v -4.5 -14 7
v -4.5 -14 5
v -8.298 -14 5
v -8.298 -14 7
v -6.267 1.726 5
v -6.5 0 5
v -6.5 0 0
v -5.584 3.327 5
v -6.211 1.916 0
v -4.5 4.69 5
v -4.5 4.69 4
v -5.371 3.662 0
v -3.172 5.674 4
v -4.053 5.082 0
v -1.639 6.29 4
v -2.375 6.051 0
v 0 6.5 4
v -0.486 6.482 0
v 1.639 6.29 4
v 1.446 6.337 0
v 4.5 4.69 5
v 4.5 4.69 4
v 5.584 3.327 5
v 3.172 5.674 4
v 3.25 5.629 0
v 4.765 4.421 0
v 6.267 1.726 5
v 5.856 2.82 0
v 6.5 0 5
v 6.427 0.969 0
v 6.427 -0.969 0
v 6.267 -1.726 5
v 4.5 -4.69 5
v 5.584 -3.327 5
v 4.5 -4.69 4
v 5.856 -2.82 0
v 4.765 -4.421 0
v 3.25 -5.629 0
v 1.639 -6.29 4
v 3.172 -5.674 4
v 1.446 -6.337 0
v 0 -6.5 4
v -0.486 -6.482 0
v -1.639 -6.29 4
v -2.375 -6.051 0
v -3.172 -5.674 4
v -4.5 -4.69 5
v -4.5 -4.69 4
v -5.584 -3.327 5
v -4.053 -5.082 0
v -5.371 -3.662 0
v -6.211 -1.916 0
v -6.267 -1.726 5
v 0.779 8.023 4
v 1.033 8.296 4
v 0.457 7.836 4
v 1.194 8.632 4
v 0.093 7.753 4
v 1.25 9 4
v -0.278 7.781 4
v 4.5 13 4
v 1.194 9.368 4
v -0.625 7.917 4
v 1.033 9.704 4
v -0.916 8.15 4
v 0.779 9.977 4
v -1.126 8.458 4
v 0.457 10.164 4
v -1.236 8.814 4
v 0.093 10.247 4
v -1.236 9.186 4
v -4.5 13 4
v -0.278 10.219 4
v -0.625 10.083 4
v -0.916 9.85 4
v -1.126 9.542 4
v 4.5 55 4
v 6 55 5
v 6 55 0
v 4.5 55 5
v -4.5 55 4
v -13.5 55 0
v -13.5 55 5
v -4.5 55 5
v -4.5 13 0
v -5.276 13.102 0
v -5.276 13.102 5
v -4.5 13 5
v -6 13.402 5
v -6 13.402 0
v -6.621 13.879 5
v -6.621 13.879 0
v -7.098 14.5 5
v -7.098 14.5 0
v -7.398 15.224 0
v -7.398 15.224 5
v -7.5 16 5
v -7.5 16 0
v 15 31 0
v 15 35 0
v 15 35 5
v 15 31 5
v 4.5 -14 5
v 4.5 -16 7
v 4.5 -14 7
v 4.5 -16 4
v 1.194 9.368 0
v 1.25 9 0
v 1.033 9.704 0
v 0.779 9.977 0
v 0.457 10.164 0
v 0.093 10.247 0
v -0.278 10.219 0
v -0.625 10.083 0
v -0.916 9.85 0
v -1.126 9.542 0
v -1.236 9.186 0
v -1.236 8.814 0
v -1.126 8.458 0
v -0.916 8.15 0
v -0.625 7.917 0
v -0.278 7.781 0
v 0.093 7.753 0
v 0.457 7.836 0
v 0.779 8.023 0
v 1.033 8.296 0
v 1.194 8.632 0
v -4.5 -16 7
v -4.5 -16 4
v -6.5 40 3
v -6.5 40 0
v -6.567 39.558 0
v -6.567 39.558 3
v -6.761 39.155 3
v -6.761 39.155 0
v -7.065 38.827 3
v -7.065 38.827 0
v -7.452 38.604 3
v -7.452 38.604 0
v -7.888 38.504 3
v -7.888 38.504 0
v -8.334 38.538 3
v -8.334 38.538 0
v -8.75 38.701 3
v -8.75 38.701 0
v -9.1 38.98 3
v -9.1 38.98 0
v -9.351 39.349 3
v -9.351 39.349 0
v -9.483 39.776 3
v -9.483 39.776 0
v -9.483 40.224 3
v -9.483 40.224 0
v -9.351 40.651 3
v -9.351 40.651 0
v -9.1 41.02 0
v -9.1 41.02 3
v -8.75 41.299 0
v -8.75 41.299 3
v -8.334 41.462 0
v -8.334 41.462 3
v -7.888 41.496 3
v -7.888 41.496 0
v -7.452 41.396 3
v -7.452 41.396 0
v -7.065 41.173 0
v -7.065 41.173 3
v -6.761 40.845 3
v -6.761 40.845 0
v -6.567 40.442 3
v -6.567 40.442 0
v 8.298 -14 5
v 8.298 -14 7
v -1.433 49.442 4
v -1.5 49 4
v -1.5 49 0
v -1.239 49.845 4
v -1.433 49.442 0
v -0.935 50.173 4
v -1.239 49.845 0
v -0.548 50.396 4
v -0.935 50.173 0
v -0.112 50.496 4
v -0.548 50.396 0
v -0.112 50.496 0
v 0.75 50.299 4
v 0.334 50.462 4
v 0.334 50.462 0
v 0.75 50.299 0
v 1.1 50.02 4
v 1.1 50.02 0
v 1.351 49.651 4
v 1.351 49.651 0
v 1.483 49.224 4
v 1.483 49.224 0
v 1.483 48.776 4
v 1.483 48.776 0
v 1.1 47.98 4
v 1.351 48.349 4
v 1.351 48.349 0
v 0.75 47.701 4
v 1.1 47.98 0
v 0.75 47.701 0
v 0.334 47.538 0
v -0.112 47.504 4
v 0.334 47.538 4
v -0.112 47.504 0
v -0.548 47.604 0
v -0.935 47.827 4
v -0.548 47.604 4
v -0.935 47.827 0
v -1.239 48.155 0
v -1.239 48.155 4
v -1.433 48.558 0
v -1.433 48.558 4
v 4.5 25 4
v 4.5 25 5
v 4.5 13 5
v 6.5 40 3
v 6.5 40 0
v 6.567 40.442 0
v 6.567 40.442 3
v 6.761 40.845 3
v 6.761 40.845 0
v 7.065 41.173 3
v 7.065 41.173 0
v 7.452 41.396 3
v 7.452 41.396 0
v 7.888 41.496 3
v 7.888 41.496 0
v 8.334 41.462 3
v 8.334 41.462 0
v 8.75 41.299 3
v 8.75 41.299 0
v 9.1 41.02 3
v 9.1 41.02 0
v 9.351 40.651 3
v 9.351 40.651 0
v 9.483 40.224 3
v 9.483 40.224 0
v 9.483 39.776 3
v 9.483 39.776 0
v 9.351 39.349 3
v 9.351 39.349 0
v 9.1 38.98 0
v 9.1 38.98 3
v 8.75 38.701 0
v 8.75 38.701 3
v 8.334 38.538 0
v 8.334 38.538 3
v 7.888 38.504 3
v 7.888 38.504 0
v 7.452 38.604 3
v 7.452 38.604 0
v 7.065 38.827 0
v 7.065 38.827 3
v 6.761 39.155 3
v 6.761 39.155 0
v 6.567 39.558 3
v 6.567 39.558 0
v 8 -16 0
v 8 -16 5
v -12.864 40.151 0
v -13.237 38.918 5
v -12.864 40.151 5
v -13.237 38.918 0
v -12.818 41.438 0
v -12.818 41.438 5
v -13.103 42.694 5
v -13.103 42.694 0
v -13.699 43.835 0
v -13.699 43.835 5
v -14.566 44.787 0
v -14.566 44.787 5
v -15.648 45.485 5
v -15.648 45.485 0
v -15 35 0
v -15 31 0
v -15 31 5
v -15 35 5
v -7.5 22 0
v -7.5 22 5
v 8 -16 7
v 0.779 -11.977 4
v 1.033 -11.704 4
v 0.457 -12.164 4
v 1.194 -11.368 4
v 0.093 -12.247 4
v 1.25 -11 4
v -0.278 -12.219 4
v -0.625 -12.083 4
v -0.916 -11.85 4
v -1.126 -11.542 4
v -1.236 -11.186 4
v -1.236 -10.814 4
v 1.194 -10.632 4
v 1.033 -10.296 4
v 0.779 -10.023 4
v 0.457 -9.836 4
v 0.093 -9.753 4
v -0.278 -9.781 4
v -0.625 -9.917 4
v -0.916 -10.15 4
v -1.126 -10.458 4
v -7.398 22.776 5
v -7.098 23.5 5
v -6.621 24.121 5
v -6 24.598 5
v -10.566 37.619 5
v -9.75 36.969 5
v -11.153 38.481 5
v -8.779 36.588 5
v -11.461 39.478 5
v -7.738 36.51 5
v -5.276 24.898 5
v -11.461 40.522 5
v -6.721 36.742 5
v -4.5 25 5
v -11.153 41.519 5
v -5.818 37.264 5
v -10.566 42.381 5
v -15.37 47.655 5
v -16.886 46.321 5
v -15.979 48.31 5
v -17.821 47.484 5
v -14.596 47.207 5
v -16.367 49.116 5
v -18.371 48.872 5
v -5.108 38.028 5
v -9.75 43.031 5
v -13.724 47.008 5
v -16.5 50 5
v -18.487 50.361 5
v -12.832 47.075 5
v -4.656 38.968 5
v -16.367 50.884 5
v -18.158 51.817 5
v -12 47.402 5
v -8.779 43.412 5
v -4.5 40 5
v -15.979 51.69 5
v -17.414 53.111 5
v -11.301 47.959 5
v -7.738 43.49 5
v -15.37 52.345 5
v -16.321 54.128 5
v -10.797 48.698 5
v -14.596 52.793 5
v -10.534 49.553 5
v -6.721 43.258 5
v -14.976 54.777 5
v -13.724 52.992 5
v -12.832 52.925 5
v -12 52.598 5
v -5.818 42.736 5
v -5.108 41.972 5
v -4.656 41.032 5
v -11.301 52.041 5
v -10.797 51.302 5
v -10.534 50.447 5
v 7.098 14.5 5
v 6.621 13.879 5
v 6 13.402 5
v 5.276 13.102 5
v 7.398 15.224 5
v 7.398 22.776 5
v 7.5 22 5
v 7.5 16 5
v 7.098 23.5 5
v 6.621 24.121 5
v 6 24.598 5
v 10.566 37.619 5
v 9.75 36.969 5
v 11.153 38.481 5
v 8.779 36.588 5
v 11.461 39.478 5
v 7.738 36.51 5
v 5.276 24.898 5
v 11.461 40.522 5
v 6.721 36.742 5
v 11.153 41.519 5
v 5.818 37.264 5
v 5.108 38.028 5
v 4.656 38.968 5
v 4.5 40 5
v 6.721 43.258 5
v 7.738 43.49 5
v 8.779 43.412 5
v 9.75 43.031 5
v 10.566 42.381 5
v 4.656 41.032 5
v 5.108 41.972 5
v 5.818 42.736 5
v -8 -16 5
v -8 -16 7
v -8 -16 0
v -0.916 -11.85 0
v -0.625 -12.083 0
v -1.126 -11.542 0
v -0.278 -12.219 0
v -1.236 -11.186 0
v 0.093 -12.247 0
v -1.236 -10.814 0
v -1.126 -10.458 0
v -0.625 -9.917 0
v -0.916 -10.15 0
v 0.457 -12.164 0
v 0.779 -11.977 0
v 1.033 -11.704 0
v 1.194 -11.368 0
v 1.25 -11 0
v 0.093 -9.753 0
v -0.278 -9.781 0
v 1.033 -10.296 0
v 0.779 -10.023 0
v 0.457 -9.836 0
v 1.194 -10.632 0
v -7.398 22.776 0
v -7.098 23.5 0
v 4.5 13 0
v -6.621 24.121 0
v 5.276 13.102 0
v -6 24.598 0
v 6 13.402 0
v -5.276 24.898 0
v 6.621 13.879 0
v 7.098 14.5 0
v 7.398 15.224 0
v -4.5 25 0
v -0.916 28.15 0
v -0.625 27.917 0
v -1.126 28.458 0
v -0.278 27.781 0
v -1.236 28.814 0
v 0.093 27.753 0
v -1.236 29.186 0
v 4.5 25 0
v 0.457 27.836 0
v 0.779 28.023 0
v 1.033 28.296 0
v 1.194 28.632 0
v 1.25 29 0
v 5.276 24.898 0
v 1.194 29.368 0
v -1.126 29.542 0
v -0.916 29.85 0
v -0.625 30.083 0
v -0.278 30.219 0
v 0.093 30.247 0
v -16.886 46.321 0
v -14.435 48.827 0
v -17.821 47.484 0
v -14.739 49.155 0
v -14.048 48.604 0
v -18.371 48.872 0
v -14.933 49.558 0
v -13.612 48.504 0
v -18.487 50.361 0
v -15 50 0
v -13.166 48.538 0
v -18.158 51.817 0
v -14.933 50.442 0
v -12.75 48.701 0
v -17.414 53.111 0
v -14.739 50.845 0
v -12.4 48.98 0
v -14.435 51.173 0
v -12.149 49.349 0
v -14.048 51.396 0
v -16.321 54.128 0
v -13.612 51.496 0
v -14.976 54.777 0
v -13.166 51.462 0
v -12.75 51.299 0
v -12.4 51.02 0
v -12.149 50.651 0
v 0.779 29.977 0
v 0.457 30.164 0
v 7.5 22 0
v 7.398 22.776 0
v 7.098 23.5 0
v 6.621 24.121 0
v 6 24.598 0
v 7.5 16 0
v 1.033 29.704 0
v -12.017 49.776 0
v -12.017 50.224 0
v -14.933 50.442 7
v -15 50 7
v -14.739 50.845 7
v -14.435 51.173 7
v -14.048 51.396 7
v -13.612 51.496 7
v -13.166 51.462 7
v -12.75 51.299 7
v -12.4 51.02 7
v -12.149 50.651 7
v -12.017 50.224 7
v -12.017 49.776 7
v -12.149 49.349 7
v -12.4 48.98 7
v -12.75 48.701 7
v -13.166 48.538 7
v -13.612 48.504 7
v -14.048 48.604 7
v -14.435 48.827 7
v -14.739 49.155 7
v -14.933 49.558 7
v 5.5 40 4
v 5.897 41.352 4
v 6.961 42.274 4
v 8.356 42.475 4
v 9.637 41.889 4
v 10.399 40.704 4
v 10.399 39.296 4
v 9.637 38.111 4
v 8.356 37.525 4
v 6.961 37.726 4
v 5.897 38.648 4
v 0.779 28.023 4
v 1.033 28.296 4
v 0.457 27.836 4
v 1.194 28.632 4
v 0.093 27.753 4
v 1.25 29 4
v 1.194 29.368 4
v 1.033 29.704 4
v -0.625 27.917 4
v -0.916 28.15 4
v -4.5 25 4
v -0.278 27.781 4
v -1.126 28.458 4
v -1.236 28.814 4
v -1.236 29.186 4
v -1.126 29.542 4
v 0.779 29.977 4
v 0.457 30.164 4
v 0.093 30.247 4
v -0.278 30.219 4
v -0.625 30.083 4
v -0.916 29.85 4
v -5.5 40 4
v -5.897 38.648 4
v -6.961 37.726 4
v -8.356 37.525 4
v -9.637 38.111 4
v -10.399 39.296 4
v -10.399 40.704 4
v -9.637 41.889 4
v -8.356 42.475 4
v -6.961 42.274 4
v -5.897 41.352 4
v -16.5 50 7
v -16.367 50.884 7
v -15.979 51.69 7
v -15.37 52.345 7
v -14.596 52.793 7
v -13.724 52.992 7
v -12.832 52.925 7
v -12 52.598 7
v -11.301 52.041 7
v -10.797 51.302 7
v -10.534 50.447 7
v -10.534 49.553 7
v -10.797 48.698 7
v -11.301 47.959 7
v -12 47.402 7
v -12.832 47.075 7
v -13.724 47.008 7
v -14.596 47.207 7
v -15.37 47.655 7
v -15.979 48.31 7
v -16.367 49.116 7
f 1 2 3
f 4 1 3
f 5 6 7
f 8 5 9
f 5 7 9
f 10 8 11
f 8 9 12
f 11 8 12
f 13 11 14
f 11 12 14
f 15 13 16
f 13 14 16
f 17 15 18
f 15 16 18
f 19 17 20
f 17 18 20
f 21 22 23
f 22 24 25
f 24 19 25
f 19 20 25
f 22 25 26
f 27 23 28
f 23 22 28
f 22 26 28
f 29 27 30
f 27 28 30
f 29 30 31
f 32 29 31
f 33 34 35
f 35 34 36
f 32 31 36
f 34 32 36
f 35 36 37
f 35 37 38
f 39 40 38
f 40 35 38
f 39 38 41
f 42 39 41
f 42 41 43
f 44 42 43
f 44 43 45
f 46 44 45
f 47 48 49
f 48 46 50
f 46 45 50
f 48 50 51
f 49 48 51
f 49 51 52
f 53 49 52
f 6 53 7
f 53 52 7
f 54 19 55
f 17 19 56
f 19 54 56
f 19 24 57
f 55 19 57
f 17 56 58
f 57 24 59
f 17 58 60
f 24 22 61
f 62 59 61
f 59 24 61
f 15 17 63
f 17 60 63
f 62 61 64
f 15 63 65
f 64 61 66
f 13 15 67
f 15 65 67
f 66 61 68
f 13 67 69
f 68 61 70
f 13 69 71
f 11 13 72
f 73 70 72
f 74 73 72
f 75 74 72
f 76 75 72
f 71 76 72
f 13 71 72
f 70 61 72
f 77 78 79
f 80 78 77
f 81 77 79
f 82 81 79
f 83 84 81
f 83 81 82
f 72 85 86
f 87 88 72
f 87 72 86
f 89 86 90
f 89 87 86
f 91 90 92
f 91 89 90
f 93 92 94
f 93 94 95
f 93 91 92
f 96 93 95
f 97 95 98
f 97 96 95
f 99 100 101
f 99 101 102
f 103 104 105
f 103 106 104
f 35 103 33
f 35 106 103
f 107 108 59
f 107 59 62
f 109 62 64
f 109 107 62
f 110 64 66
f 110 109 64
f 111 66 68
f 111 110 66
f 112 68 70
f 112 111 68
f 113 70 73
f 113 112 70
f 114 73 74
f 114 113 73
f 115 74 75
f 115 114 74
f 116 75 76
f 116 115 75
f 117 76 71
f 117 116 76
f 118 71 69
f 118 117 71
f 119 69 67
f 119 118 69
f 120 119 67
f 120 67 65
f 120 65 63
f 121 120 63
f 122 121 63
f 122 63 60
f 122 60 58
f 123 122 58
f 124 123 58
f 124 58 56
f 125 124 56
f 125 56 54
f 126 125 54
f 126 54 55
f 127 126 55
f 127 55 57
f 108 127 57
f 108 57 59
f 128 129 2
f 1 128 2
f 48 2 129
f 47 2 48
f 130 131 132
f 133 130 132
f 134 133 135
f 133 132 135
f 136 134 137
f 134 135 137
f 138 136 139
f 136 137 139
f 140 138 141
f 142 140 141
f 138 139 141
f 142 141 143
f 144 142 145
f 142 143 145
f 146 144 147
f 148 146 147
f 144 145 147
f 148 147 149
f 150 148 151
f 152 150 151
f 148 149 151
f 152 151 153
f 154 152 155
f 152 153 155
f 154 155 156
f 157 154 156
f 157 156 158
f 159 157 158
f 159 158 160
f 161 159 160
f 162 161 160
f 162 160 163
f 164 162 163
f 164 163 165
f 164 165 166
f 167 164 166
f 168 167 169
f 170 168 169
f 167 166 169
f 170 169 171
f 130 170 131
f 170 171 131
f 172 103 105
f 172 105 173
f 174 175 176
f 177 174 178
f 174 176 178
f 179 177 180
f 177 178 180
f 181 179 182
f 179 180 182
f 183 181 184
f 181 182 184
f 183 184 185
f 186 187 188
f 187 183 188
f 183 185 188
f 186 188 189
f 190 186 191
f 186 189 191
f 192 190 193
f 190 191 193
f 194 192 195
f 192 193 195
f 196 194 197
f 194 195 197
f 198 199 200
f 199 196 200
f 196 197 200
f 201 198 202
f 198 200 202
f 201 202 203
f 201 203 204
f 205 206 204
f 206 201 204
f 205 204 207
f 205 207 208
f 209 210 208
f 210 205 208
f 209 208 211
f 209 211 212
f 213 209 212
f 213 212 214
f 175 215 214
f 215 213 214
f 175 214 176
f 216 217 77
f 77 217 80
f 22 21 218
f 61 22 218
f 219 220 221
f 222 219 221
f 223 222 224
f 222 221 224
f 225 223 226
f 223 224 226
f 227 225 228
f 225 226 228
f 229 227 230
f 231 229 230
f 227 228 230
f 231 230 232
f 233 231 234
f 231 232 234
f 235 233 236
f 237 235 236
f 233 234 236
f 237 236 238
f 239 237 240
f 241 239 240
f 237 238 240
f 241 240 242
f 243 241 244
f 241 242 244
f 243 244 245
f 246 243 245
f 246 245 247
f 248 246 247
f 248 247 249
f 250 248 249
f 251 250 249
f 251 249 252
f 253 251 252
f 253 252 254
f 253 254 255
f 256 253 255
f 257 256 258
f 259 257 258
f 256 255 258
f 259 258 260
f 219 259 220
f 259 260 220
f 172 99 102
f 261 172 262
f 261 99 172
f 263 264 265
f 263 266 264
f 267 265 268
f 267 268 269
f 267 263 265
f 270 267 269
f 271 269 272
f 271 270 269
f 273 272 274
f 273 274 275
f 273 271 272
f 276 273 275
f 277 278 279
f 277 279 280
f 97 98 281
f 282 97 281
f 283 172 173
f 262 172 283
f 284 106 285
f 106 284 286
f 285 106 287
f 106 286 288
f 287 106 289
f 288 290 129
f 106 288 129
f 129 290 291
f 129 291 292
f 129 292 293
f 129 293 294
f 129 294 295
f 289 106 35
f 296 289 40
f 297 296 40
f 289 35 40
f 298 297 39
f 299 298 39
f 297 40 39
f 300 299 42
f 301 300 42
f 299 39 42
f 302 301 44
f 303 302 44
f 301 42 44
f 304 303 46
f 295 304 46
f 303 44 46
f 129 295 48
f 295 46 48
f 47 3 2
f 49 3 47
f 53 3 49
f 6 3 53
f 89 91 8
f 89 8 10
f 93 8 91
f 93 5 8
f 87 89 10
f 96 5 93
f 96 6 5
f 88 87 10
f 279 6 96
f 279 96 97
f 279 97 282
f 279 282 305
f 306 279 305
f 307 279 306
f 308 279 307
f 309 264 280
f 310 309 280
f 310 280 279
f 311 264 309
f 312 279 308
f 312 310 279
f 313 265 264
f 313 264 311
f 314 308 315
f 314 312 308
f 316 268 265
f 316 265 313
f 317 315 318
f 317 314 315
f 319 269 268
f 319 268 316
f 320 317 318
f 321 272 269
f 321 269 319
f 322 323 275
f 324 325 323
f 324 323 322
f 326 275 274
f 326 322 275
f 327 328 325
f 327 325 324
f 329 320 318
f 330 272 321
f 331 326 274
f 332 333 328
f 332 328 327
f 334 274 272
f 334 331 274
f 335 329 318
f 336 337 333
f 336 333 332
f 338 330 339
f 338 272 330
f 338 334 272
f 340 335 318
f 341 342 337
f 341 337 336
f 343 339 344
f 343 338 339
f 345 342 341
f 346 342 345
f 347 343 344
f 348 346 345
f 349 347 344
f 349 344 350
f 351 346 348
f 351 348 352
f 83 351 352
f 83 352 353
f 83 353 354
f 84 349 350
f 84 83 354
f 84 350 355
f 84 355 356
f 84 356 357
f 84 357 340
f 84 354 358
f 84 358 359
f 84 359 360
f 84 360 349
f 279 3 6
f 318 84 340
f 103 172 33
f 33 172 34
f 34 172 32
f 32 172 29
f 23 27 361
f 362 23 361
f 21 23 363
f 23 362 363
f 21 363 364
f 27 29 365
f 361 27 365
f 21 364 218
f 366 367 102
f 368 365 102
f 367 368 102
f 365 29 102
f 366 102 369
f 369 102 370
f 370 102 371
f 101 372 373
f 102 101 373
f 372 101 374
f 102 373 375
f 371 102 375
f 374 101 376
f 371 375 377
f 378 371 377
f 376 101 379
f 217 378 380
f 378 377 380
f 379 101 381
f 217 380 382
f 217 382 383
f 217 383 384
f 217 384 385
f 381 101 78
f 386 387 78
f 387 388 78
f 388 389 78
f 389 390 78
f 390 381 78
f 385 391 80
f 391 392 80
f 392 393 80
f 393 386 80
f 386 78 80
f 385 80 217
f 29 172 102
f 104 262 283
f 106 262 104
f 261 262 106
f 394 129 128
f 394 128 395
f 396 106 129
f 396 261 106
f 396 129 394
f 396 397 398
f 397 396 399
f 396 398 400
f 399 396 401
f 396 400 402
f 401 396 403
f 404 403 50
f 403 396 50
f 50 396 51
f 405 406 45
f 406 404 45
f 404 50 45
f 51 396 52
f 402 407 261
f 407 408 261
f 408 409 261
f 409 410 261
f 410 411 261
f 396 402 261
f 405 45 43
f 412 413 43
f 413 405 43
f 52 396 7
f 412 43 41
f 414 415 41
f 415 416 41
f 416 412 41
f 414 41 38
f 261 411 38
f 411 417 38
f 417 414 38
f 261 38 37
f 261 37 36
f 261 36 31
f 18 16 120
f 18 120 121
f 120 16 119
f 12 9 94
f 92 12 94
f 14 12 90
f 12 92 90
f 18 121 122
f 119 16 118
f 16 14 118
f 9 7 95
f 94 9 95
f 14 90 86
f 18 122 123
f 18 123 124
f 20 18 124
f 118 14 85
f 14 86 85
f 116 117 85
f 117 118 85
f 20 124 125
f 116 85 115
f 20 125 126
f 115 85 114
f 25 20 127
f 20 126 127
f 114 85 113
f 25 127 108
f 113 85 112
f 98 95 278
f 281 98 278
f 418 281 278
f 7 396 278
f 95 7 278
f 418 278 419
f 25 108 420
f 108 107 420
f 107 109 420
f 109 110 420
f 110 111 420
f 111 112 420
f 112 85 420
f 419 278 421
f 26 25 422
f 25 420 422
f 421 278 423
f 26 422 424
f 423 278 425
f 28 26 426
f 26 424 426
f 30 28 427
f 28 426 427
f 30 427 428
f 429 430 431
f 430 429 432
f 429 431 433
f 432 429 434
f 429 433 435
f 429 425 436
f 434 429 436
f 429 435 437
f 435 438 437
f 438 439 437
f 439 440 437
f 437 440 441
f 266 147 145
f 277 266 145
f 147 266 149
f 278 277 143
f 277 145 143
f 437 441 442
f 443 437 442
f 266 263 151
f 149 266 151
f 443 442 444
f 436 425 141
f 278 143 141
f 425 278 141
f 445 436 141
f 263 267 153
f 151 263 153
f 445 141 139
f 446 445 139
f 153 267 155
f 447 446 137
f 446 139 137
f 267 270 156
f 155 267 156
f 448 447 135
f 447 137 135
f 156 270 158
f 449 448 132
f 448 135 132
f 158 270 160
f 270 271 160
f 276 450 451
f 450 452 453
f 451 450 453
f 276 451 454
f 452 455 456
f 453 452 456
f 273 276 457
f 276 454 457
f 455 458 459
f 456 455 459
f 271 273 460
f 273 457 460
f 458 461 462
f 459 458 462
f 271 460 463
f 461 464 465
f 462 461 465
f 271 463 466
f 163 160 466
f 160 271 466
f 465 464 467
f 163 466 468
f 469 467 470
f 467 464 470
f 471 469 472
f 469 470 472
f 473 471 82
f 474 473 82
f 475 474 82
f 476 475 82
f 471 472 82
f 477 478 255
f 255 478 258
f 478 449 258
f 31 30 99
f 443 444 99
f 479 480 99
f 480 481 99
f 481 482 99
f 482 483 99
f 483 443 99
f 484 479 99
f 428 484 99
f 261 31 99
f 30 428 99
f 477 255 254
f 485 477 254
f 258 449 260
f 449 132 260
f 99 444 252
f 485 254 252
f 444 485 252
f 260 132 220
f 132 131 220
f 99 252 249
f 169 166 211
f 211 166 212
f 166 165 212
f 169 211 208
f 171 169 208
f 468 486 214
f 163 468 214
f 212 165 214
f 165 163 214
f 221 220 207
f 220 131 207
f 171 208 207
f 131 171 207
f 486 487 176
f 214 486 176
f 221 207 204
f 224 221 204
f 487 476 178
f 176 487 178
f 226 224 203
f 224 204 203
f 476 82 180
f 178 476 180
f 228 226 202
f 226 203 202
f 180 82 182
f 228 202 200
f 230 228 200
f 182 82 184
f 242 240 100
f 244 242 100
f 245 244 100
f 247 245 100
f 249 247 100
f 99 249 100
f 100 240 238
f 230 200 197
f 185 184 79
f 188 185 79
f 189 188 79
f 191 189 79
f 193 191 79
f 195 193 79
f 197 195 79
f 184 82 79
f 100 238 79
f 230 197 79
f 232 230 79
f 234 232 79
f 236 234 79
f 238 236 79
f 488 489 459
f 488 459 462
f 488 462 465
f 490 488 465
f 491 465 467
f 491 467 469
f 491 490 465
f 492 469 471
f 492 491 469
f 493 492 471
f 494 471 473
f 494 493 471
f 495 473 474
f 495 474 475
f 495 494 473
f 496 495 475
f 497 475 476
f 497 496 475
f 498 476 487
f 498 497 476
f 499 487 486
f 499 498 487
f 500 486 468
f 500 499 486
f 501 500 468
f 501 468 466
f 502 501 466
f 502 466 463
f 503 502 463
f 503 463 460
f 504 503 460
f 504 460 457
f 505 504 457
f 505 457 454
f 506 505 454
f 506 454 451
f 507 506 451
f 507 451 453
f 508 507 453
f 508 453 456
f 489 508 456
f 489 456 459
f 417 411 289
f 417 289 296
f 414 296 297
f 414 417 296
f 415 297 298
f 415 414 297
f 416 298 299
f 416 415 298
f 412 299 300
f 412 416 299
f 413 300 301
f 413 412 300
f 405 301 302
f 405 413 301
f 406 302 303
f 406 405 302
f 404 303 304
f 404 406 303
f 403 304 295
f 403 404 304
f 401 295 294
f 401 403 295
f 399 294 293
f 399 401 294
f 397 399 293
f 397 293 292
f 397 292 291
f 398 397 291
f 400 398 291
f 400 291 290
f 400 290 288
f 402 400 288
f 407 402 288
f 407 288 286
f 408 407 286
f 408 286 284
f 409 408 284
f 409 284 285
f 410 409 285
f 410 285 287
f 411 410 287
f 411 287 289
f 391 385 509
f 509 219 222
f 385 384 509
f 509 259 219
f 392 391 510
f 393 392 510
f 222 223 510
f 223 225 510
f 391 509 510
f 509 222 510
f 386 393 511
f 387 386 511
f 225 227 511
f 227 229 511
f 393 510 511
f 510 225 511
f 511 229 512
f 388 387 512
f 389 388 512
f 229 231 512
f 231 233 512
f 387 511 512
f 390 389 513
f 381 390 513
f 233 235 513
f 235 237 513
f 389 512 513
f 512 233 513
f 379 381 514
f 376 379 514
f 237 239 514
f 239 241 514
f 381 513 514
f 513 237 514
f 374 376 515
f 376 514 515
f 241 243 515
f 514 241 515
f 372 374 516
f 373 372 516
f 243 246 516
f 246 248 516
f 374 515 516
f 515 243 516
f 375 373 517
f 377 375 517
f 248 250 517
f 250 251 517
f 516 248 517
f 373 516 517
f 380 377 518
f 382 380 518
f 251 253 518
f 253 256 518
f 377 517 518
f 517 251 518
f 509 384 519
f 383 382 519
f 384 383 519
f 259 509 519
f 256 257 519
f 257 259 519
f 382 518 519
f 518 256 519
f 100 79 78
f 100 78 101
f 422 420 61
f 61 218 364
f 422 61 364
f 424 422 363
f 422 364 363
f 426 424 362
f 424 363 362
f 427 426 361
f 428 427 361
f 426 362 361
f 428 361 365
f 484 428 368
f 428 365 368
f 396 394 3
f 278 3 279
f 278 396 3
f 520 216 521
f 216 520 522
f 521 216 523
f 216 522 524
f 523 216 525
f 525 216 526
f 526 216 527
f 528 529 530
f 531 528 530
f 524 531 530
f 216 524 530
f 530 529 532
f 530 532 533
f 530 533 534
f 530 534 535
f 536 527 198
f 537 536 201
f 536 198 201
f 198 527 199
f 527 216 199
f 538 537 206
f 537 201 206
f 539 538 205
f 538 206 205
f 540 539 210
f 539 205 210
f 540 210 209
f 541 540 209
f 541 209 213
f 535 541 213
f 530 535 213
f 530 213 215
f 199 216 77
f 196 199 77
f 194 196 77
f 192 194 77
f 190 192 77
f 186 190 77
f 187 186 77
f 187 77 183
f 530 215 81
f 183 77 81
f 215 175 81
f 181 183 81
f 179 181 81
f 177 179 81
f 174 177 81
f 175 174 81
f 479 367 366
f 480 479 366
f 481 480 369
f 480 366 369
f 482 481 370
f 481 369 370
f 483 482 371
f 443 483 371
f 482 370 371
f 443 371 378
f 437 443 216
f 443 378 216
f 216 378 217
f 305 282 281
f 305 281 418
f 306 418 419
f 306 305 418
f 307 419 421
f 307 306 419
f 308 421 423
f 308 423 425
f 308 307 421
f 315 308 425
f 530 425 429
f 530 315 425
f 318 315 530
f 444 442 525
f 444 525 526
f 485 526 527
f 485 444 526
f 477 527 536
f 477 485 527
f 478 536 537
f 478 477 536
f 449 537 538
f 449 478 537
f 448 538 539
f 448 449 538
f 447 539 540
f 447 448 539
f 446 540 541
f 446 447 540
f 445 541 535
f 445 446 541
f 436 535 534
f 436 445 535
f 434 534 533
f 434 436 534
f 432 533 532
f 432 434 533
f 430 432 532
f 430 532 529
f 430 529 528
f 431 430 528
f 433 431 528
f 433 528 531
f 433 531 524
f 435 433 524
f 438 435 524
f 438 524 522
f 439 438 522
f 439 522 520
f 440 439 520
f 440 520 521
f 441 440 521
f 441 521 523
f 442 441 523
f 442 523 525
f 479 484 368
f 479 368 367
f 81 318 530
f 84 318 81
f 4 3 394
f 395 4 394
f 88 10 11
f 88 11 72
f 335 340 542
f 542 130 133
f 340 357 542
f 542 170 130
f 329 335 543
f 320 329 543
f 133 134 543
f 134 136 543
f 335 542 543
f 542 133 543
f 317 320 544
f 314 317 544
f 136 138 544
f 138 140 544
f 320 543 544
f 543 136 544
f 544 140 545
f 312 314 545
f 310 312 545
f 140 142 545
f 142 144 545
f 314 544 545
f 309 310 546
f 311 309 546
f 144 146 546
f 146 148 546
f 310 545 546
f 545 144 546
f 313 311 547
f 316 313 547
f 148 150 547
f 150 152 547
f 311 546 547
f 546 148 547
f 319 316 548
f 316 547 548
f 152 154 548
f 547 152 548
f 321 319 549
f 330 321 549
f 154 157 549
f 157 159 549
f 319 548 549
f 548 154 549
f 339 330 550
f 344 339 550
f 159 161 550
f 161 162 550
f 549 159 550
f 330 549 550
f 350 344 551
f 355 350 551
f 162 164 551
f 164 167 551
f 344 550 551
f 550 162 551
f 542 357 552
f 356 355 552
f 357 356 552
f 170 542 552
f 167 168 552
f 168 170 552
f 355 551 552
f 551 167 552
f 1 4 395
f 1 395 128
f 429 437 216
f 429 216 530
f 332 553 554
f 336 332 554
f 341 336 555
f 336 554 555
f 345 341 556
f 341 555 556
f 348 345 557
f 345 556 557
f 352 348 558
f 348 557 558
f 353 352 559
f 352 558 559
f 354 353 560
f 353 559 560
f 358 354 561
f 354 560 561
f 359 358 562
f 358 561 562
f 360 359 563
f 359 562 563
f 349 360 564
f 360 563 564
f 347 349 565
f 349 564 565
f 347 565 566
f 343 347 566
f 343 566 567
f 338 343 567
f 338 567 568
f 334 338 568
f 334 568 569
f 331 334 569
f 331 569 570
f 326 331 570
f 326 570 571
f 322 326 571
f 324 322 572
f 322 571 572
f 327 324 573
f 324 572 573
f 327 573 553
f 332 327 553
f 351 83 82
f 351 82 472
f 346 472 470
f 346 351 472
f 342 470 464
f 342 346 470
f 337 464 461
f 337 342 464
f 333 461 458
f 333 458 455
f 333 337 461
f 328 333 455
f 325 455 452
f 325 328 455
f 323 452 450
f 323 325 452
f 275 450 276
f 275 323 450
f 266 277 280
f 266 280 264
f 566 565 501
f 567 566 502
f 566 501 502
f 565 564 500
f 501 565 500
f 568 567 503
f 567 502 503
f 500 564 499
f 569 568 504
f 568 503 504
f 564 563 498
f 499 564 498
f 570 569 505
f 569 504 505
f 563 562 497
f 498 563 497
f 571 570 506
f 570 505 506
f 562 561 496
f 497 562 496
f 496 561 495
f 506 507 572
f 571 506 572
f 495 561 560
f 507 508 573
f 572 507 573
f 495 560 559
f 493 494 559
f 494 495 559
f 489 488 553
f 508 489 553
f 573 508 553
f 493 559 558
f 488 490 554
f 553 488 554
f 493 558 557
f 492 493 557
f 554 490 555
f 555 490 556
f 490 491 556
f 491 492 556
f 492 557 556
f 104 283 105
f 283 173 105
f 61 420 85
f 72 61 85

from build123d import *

# Parameters (mm, degrees)
SKETCH_1_R          = 6.5
SKETCH_1_R_2        = 1.5
SKETCH_1_W          = 15
SKETCH_1_H          = 12
EXTRUDE_1_DEPTH     = 5
HOLE_WIZARD_M3_1_D  = 2.5
SKETCH_2_W          = 9
SKETCH_2_H          = 83.78955867
CUT_EXTRUDE_1_DEPTH = 1
FILLET_1_R          = 3
EXTRUDE_2_DEPTH     = 2
CHAMFER_1_SIZE      = 2
SKETCH_5_R          = 1.5
EXTRUDE_4_DEPTH     = 5
FILLET_2_R          = 5
EXTRUDE_START       = 2
SKETCH_6_R          = 3
SKETCH_6_R_2        = 1.5
EXTRUDE_5_DEPTH     = 2


with BuildPart() as part:
    # 草图1 → 凸台-拉伸1 (new body)
    with BuildSketch(Plane.XY):
        Polygon((6, 55), (-6, 55), (-15, 35), (-15, 31), (-8, -16), (8, -16), (15, 31), (15, 35), align=None)
        Circle(SKETCH_1_R, mode=Mode.SUBTRACT)
        with Locations((0, 49)):
            Circle(SKETCH_1_R_2, mode=Mode.SUBTRACT)
        with Locations((-8, 40)):
            Circle(SKETCH_1_R_2, mode=Mode.SUBTRACT)
        with Locations(Location((8, 40, 0), (0, 0, 180))):
            Circle(SKETCH_1_R_2, mode=Mode.SUBTRACT)
        with Locations((0, 19)):
            Rectangle(SKETCH_1_W, SKETCH_1_H, mode=Mode.SUBTRACT)
    extrude(amount=EXTRUDE_1_DEPTH)

    # M3 螺纹孔1 (through all)
    with Locations(Plane.XY.offset(5)):
        with Locations((0, 29), (0, 9), (0, -11)):
            Hole(HOLE_WIZARD_M3_1_D / 2)

    # 草图2 → 切除-拉伸1 (cut)
    with BuildSketch(Plane.XY.offset(5)):
        with Locations((0, 22.915271632)):
            Rectangle(SKETCH_2_W, SKETCH_2_H)
    extrude(amount=-CUT_EXTRUDE_1_DEPTH, mode=Mode.SUBTRACT)

    # 圆角1
    fillet_1_edges = [part.edges().sort_by_distance(p)[0] for p in [
        (7.5, 13, 2.5),
        (-7.5, 13, 2.5),
        (-7.5, 25, 2.5),
        (7.5, 25, 2.5),
    ]]
    fillet(fillet_1_edges, radius=FILLET_1_R)

    # 草图4 → 凸台-拉伸2 (add)
    with BuildSketch(Plane.XY.offset(5)):
        Polygon((-8, -16), (-4.5, -16), (-4.5, -14), (-8.29787234, -14), align=None)
        Polygon((4.5, -14), (8.29787234, -14), (8, -16), (4.5, -16), align=None)
    extrude(amount=EXTRUDE_2_DEPTH)

    # 倒角1
    chamfer_1_edges = [part.edges().sort_by_distance(p)[0] for p in [
        (-9.5, 40, 5),
        (9.5, 40, 5),
    ]]
    chamfer(chamfer_1_edges, length=CHAMFER_1_SIZE - 0.0001)  # a hair under: the kernel refuses the full size

    # 草图5 → 凸台-拉伸4 (add)
    with BuildSketch(Plane.XY.offset(5)):
        with BuildLine():
            Line((6, 55), (13.5, 55))
            ThreePointArc((13.5, 55), (18.049597051, 47.926074574), (9.725789999, 46.720466669))
            Line((9.725789999, 46.720466669), (6, 55))
        make_face()
        with Locations((13.5, 50)):
            Circle(SKETCH_5_R, mode=Mode.SUBTRACT)
    extrude(amount=-EXTRUDE_4_DEPTH)

    # 圆角2
    fillet_2_edges = [part.edges().sort_by_distance(p)[0] for p in [
        (9.725789999, 46.720466669, 2.5),
    ]]
    fillet(fillet_2_edges, radius=FILLET_2_R)

    # 草图6 → 凸台-拉伸5 (add)
    with BuildSketch(Plane.XY.offset(5).offset(EXTRUDE_START)):
        with Locations((13.5, 50)):
            Circle(SKETCH_6_R)
        with Locations((13.5, 50)):
            Circle(SKETCH_6_R_2, mode=Mode.SUBTRACT)
    extrude(amount=-EXTRUDE_5_DEPTH)


with BuildPart() as body_2:
    # 镜向1: mirrored copy
    add(part.part.mirror(Plane(origin=(0, 0, 0), x_dir=(0, 0, 1), z_dir=(1, 0, 0))))


solid = body_2.part
